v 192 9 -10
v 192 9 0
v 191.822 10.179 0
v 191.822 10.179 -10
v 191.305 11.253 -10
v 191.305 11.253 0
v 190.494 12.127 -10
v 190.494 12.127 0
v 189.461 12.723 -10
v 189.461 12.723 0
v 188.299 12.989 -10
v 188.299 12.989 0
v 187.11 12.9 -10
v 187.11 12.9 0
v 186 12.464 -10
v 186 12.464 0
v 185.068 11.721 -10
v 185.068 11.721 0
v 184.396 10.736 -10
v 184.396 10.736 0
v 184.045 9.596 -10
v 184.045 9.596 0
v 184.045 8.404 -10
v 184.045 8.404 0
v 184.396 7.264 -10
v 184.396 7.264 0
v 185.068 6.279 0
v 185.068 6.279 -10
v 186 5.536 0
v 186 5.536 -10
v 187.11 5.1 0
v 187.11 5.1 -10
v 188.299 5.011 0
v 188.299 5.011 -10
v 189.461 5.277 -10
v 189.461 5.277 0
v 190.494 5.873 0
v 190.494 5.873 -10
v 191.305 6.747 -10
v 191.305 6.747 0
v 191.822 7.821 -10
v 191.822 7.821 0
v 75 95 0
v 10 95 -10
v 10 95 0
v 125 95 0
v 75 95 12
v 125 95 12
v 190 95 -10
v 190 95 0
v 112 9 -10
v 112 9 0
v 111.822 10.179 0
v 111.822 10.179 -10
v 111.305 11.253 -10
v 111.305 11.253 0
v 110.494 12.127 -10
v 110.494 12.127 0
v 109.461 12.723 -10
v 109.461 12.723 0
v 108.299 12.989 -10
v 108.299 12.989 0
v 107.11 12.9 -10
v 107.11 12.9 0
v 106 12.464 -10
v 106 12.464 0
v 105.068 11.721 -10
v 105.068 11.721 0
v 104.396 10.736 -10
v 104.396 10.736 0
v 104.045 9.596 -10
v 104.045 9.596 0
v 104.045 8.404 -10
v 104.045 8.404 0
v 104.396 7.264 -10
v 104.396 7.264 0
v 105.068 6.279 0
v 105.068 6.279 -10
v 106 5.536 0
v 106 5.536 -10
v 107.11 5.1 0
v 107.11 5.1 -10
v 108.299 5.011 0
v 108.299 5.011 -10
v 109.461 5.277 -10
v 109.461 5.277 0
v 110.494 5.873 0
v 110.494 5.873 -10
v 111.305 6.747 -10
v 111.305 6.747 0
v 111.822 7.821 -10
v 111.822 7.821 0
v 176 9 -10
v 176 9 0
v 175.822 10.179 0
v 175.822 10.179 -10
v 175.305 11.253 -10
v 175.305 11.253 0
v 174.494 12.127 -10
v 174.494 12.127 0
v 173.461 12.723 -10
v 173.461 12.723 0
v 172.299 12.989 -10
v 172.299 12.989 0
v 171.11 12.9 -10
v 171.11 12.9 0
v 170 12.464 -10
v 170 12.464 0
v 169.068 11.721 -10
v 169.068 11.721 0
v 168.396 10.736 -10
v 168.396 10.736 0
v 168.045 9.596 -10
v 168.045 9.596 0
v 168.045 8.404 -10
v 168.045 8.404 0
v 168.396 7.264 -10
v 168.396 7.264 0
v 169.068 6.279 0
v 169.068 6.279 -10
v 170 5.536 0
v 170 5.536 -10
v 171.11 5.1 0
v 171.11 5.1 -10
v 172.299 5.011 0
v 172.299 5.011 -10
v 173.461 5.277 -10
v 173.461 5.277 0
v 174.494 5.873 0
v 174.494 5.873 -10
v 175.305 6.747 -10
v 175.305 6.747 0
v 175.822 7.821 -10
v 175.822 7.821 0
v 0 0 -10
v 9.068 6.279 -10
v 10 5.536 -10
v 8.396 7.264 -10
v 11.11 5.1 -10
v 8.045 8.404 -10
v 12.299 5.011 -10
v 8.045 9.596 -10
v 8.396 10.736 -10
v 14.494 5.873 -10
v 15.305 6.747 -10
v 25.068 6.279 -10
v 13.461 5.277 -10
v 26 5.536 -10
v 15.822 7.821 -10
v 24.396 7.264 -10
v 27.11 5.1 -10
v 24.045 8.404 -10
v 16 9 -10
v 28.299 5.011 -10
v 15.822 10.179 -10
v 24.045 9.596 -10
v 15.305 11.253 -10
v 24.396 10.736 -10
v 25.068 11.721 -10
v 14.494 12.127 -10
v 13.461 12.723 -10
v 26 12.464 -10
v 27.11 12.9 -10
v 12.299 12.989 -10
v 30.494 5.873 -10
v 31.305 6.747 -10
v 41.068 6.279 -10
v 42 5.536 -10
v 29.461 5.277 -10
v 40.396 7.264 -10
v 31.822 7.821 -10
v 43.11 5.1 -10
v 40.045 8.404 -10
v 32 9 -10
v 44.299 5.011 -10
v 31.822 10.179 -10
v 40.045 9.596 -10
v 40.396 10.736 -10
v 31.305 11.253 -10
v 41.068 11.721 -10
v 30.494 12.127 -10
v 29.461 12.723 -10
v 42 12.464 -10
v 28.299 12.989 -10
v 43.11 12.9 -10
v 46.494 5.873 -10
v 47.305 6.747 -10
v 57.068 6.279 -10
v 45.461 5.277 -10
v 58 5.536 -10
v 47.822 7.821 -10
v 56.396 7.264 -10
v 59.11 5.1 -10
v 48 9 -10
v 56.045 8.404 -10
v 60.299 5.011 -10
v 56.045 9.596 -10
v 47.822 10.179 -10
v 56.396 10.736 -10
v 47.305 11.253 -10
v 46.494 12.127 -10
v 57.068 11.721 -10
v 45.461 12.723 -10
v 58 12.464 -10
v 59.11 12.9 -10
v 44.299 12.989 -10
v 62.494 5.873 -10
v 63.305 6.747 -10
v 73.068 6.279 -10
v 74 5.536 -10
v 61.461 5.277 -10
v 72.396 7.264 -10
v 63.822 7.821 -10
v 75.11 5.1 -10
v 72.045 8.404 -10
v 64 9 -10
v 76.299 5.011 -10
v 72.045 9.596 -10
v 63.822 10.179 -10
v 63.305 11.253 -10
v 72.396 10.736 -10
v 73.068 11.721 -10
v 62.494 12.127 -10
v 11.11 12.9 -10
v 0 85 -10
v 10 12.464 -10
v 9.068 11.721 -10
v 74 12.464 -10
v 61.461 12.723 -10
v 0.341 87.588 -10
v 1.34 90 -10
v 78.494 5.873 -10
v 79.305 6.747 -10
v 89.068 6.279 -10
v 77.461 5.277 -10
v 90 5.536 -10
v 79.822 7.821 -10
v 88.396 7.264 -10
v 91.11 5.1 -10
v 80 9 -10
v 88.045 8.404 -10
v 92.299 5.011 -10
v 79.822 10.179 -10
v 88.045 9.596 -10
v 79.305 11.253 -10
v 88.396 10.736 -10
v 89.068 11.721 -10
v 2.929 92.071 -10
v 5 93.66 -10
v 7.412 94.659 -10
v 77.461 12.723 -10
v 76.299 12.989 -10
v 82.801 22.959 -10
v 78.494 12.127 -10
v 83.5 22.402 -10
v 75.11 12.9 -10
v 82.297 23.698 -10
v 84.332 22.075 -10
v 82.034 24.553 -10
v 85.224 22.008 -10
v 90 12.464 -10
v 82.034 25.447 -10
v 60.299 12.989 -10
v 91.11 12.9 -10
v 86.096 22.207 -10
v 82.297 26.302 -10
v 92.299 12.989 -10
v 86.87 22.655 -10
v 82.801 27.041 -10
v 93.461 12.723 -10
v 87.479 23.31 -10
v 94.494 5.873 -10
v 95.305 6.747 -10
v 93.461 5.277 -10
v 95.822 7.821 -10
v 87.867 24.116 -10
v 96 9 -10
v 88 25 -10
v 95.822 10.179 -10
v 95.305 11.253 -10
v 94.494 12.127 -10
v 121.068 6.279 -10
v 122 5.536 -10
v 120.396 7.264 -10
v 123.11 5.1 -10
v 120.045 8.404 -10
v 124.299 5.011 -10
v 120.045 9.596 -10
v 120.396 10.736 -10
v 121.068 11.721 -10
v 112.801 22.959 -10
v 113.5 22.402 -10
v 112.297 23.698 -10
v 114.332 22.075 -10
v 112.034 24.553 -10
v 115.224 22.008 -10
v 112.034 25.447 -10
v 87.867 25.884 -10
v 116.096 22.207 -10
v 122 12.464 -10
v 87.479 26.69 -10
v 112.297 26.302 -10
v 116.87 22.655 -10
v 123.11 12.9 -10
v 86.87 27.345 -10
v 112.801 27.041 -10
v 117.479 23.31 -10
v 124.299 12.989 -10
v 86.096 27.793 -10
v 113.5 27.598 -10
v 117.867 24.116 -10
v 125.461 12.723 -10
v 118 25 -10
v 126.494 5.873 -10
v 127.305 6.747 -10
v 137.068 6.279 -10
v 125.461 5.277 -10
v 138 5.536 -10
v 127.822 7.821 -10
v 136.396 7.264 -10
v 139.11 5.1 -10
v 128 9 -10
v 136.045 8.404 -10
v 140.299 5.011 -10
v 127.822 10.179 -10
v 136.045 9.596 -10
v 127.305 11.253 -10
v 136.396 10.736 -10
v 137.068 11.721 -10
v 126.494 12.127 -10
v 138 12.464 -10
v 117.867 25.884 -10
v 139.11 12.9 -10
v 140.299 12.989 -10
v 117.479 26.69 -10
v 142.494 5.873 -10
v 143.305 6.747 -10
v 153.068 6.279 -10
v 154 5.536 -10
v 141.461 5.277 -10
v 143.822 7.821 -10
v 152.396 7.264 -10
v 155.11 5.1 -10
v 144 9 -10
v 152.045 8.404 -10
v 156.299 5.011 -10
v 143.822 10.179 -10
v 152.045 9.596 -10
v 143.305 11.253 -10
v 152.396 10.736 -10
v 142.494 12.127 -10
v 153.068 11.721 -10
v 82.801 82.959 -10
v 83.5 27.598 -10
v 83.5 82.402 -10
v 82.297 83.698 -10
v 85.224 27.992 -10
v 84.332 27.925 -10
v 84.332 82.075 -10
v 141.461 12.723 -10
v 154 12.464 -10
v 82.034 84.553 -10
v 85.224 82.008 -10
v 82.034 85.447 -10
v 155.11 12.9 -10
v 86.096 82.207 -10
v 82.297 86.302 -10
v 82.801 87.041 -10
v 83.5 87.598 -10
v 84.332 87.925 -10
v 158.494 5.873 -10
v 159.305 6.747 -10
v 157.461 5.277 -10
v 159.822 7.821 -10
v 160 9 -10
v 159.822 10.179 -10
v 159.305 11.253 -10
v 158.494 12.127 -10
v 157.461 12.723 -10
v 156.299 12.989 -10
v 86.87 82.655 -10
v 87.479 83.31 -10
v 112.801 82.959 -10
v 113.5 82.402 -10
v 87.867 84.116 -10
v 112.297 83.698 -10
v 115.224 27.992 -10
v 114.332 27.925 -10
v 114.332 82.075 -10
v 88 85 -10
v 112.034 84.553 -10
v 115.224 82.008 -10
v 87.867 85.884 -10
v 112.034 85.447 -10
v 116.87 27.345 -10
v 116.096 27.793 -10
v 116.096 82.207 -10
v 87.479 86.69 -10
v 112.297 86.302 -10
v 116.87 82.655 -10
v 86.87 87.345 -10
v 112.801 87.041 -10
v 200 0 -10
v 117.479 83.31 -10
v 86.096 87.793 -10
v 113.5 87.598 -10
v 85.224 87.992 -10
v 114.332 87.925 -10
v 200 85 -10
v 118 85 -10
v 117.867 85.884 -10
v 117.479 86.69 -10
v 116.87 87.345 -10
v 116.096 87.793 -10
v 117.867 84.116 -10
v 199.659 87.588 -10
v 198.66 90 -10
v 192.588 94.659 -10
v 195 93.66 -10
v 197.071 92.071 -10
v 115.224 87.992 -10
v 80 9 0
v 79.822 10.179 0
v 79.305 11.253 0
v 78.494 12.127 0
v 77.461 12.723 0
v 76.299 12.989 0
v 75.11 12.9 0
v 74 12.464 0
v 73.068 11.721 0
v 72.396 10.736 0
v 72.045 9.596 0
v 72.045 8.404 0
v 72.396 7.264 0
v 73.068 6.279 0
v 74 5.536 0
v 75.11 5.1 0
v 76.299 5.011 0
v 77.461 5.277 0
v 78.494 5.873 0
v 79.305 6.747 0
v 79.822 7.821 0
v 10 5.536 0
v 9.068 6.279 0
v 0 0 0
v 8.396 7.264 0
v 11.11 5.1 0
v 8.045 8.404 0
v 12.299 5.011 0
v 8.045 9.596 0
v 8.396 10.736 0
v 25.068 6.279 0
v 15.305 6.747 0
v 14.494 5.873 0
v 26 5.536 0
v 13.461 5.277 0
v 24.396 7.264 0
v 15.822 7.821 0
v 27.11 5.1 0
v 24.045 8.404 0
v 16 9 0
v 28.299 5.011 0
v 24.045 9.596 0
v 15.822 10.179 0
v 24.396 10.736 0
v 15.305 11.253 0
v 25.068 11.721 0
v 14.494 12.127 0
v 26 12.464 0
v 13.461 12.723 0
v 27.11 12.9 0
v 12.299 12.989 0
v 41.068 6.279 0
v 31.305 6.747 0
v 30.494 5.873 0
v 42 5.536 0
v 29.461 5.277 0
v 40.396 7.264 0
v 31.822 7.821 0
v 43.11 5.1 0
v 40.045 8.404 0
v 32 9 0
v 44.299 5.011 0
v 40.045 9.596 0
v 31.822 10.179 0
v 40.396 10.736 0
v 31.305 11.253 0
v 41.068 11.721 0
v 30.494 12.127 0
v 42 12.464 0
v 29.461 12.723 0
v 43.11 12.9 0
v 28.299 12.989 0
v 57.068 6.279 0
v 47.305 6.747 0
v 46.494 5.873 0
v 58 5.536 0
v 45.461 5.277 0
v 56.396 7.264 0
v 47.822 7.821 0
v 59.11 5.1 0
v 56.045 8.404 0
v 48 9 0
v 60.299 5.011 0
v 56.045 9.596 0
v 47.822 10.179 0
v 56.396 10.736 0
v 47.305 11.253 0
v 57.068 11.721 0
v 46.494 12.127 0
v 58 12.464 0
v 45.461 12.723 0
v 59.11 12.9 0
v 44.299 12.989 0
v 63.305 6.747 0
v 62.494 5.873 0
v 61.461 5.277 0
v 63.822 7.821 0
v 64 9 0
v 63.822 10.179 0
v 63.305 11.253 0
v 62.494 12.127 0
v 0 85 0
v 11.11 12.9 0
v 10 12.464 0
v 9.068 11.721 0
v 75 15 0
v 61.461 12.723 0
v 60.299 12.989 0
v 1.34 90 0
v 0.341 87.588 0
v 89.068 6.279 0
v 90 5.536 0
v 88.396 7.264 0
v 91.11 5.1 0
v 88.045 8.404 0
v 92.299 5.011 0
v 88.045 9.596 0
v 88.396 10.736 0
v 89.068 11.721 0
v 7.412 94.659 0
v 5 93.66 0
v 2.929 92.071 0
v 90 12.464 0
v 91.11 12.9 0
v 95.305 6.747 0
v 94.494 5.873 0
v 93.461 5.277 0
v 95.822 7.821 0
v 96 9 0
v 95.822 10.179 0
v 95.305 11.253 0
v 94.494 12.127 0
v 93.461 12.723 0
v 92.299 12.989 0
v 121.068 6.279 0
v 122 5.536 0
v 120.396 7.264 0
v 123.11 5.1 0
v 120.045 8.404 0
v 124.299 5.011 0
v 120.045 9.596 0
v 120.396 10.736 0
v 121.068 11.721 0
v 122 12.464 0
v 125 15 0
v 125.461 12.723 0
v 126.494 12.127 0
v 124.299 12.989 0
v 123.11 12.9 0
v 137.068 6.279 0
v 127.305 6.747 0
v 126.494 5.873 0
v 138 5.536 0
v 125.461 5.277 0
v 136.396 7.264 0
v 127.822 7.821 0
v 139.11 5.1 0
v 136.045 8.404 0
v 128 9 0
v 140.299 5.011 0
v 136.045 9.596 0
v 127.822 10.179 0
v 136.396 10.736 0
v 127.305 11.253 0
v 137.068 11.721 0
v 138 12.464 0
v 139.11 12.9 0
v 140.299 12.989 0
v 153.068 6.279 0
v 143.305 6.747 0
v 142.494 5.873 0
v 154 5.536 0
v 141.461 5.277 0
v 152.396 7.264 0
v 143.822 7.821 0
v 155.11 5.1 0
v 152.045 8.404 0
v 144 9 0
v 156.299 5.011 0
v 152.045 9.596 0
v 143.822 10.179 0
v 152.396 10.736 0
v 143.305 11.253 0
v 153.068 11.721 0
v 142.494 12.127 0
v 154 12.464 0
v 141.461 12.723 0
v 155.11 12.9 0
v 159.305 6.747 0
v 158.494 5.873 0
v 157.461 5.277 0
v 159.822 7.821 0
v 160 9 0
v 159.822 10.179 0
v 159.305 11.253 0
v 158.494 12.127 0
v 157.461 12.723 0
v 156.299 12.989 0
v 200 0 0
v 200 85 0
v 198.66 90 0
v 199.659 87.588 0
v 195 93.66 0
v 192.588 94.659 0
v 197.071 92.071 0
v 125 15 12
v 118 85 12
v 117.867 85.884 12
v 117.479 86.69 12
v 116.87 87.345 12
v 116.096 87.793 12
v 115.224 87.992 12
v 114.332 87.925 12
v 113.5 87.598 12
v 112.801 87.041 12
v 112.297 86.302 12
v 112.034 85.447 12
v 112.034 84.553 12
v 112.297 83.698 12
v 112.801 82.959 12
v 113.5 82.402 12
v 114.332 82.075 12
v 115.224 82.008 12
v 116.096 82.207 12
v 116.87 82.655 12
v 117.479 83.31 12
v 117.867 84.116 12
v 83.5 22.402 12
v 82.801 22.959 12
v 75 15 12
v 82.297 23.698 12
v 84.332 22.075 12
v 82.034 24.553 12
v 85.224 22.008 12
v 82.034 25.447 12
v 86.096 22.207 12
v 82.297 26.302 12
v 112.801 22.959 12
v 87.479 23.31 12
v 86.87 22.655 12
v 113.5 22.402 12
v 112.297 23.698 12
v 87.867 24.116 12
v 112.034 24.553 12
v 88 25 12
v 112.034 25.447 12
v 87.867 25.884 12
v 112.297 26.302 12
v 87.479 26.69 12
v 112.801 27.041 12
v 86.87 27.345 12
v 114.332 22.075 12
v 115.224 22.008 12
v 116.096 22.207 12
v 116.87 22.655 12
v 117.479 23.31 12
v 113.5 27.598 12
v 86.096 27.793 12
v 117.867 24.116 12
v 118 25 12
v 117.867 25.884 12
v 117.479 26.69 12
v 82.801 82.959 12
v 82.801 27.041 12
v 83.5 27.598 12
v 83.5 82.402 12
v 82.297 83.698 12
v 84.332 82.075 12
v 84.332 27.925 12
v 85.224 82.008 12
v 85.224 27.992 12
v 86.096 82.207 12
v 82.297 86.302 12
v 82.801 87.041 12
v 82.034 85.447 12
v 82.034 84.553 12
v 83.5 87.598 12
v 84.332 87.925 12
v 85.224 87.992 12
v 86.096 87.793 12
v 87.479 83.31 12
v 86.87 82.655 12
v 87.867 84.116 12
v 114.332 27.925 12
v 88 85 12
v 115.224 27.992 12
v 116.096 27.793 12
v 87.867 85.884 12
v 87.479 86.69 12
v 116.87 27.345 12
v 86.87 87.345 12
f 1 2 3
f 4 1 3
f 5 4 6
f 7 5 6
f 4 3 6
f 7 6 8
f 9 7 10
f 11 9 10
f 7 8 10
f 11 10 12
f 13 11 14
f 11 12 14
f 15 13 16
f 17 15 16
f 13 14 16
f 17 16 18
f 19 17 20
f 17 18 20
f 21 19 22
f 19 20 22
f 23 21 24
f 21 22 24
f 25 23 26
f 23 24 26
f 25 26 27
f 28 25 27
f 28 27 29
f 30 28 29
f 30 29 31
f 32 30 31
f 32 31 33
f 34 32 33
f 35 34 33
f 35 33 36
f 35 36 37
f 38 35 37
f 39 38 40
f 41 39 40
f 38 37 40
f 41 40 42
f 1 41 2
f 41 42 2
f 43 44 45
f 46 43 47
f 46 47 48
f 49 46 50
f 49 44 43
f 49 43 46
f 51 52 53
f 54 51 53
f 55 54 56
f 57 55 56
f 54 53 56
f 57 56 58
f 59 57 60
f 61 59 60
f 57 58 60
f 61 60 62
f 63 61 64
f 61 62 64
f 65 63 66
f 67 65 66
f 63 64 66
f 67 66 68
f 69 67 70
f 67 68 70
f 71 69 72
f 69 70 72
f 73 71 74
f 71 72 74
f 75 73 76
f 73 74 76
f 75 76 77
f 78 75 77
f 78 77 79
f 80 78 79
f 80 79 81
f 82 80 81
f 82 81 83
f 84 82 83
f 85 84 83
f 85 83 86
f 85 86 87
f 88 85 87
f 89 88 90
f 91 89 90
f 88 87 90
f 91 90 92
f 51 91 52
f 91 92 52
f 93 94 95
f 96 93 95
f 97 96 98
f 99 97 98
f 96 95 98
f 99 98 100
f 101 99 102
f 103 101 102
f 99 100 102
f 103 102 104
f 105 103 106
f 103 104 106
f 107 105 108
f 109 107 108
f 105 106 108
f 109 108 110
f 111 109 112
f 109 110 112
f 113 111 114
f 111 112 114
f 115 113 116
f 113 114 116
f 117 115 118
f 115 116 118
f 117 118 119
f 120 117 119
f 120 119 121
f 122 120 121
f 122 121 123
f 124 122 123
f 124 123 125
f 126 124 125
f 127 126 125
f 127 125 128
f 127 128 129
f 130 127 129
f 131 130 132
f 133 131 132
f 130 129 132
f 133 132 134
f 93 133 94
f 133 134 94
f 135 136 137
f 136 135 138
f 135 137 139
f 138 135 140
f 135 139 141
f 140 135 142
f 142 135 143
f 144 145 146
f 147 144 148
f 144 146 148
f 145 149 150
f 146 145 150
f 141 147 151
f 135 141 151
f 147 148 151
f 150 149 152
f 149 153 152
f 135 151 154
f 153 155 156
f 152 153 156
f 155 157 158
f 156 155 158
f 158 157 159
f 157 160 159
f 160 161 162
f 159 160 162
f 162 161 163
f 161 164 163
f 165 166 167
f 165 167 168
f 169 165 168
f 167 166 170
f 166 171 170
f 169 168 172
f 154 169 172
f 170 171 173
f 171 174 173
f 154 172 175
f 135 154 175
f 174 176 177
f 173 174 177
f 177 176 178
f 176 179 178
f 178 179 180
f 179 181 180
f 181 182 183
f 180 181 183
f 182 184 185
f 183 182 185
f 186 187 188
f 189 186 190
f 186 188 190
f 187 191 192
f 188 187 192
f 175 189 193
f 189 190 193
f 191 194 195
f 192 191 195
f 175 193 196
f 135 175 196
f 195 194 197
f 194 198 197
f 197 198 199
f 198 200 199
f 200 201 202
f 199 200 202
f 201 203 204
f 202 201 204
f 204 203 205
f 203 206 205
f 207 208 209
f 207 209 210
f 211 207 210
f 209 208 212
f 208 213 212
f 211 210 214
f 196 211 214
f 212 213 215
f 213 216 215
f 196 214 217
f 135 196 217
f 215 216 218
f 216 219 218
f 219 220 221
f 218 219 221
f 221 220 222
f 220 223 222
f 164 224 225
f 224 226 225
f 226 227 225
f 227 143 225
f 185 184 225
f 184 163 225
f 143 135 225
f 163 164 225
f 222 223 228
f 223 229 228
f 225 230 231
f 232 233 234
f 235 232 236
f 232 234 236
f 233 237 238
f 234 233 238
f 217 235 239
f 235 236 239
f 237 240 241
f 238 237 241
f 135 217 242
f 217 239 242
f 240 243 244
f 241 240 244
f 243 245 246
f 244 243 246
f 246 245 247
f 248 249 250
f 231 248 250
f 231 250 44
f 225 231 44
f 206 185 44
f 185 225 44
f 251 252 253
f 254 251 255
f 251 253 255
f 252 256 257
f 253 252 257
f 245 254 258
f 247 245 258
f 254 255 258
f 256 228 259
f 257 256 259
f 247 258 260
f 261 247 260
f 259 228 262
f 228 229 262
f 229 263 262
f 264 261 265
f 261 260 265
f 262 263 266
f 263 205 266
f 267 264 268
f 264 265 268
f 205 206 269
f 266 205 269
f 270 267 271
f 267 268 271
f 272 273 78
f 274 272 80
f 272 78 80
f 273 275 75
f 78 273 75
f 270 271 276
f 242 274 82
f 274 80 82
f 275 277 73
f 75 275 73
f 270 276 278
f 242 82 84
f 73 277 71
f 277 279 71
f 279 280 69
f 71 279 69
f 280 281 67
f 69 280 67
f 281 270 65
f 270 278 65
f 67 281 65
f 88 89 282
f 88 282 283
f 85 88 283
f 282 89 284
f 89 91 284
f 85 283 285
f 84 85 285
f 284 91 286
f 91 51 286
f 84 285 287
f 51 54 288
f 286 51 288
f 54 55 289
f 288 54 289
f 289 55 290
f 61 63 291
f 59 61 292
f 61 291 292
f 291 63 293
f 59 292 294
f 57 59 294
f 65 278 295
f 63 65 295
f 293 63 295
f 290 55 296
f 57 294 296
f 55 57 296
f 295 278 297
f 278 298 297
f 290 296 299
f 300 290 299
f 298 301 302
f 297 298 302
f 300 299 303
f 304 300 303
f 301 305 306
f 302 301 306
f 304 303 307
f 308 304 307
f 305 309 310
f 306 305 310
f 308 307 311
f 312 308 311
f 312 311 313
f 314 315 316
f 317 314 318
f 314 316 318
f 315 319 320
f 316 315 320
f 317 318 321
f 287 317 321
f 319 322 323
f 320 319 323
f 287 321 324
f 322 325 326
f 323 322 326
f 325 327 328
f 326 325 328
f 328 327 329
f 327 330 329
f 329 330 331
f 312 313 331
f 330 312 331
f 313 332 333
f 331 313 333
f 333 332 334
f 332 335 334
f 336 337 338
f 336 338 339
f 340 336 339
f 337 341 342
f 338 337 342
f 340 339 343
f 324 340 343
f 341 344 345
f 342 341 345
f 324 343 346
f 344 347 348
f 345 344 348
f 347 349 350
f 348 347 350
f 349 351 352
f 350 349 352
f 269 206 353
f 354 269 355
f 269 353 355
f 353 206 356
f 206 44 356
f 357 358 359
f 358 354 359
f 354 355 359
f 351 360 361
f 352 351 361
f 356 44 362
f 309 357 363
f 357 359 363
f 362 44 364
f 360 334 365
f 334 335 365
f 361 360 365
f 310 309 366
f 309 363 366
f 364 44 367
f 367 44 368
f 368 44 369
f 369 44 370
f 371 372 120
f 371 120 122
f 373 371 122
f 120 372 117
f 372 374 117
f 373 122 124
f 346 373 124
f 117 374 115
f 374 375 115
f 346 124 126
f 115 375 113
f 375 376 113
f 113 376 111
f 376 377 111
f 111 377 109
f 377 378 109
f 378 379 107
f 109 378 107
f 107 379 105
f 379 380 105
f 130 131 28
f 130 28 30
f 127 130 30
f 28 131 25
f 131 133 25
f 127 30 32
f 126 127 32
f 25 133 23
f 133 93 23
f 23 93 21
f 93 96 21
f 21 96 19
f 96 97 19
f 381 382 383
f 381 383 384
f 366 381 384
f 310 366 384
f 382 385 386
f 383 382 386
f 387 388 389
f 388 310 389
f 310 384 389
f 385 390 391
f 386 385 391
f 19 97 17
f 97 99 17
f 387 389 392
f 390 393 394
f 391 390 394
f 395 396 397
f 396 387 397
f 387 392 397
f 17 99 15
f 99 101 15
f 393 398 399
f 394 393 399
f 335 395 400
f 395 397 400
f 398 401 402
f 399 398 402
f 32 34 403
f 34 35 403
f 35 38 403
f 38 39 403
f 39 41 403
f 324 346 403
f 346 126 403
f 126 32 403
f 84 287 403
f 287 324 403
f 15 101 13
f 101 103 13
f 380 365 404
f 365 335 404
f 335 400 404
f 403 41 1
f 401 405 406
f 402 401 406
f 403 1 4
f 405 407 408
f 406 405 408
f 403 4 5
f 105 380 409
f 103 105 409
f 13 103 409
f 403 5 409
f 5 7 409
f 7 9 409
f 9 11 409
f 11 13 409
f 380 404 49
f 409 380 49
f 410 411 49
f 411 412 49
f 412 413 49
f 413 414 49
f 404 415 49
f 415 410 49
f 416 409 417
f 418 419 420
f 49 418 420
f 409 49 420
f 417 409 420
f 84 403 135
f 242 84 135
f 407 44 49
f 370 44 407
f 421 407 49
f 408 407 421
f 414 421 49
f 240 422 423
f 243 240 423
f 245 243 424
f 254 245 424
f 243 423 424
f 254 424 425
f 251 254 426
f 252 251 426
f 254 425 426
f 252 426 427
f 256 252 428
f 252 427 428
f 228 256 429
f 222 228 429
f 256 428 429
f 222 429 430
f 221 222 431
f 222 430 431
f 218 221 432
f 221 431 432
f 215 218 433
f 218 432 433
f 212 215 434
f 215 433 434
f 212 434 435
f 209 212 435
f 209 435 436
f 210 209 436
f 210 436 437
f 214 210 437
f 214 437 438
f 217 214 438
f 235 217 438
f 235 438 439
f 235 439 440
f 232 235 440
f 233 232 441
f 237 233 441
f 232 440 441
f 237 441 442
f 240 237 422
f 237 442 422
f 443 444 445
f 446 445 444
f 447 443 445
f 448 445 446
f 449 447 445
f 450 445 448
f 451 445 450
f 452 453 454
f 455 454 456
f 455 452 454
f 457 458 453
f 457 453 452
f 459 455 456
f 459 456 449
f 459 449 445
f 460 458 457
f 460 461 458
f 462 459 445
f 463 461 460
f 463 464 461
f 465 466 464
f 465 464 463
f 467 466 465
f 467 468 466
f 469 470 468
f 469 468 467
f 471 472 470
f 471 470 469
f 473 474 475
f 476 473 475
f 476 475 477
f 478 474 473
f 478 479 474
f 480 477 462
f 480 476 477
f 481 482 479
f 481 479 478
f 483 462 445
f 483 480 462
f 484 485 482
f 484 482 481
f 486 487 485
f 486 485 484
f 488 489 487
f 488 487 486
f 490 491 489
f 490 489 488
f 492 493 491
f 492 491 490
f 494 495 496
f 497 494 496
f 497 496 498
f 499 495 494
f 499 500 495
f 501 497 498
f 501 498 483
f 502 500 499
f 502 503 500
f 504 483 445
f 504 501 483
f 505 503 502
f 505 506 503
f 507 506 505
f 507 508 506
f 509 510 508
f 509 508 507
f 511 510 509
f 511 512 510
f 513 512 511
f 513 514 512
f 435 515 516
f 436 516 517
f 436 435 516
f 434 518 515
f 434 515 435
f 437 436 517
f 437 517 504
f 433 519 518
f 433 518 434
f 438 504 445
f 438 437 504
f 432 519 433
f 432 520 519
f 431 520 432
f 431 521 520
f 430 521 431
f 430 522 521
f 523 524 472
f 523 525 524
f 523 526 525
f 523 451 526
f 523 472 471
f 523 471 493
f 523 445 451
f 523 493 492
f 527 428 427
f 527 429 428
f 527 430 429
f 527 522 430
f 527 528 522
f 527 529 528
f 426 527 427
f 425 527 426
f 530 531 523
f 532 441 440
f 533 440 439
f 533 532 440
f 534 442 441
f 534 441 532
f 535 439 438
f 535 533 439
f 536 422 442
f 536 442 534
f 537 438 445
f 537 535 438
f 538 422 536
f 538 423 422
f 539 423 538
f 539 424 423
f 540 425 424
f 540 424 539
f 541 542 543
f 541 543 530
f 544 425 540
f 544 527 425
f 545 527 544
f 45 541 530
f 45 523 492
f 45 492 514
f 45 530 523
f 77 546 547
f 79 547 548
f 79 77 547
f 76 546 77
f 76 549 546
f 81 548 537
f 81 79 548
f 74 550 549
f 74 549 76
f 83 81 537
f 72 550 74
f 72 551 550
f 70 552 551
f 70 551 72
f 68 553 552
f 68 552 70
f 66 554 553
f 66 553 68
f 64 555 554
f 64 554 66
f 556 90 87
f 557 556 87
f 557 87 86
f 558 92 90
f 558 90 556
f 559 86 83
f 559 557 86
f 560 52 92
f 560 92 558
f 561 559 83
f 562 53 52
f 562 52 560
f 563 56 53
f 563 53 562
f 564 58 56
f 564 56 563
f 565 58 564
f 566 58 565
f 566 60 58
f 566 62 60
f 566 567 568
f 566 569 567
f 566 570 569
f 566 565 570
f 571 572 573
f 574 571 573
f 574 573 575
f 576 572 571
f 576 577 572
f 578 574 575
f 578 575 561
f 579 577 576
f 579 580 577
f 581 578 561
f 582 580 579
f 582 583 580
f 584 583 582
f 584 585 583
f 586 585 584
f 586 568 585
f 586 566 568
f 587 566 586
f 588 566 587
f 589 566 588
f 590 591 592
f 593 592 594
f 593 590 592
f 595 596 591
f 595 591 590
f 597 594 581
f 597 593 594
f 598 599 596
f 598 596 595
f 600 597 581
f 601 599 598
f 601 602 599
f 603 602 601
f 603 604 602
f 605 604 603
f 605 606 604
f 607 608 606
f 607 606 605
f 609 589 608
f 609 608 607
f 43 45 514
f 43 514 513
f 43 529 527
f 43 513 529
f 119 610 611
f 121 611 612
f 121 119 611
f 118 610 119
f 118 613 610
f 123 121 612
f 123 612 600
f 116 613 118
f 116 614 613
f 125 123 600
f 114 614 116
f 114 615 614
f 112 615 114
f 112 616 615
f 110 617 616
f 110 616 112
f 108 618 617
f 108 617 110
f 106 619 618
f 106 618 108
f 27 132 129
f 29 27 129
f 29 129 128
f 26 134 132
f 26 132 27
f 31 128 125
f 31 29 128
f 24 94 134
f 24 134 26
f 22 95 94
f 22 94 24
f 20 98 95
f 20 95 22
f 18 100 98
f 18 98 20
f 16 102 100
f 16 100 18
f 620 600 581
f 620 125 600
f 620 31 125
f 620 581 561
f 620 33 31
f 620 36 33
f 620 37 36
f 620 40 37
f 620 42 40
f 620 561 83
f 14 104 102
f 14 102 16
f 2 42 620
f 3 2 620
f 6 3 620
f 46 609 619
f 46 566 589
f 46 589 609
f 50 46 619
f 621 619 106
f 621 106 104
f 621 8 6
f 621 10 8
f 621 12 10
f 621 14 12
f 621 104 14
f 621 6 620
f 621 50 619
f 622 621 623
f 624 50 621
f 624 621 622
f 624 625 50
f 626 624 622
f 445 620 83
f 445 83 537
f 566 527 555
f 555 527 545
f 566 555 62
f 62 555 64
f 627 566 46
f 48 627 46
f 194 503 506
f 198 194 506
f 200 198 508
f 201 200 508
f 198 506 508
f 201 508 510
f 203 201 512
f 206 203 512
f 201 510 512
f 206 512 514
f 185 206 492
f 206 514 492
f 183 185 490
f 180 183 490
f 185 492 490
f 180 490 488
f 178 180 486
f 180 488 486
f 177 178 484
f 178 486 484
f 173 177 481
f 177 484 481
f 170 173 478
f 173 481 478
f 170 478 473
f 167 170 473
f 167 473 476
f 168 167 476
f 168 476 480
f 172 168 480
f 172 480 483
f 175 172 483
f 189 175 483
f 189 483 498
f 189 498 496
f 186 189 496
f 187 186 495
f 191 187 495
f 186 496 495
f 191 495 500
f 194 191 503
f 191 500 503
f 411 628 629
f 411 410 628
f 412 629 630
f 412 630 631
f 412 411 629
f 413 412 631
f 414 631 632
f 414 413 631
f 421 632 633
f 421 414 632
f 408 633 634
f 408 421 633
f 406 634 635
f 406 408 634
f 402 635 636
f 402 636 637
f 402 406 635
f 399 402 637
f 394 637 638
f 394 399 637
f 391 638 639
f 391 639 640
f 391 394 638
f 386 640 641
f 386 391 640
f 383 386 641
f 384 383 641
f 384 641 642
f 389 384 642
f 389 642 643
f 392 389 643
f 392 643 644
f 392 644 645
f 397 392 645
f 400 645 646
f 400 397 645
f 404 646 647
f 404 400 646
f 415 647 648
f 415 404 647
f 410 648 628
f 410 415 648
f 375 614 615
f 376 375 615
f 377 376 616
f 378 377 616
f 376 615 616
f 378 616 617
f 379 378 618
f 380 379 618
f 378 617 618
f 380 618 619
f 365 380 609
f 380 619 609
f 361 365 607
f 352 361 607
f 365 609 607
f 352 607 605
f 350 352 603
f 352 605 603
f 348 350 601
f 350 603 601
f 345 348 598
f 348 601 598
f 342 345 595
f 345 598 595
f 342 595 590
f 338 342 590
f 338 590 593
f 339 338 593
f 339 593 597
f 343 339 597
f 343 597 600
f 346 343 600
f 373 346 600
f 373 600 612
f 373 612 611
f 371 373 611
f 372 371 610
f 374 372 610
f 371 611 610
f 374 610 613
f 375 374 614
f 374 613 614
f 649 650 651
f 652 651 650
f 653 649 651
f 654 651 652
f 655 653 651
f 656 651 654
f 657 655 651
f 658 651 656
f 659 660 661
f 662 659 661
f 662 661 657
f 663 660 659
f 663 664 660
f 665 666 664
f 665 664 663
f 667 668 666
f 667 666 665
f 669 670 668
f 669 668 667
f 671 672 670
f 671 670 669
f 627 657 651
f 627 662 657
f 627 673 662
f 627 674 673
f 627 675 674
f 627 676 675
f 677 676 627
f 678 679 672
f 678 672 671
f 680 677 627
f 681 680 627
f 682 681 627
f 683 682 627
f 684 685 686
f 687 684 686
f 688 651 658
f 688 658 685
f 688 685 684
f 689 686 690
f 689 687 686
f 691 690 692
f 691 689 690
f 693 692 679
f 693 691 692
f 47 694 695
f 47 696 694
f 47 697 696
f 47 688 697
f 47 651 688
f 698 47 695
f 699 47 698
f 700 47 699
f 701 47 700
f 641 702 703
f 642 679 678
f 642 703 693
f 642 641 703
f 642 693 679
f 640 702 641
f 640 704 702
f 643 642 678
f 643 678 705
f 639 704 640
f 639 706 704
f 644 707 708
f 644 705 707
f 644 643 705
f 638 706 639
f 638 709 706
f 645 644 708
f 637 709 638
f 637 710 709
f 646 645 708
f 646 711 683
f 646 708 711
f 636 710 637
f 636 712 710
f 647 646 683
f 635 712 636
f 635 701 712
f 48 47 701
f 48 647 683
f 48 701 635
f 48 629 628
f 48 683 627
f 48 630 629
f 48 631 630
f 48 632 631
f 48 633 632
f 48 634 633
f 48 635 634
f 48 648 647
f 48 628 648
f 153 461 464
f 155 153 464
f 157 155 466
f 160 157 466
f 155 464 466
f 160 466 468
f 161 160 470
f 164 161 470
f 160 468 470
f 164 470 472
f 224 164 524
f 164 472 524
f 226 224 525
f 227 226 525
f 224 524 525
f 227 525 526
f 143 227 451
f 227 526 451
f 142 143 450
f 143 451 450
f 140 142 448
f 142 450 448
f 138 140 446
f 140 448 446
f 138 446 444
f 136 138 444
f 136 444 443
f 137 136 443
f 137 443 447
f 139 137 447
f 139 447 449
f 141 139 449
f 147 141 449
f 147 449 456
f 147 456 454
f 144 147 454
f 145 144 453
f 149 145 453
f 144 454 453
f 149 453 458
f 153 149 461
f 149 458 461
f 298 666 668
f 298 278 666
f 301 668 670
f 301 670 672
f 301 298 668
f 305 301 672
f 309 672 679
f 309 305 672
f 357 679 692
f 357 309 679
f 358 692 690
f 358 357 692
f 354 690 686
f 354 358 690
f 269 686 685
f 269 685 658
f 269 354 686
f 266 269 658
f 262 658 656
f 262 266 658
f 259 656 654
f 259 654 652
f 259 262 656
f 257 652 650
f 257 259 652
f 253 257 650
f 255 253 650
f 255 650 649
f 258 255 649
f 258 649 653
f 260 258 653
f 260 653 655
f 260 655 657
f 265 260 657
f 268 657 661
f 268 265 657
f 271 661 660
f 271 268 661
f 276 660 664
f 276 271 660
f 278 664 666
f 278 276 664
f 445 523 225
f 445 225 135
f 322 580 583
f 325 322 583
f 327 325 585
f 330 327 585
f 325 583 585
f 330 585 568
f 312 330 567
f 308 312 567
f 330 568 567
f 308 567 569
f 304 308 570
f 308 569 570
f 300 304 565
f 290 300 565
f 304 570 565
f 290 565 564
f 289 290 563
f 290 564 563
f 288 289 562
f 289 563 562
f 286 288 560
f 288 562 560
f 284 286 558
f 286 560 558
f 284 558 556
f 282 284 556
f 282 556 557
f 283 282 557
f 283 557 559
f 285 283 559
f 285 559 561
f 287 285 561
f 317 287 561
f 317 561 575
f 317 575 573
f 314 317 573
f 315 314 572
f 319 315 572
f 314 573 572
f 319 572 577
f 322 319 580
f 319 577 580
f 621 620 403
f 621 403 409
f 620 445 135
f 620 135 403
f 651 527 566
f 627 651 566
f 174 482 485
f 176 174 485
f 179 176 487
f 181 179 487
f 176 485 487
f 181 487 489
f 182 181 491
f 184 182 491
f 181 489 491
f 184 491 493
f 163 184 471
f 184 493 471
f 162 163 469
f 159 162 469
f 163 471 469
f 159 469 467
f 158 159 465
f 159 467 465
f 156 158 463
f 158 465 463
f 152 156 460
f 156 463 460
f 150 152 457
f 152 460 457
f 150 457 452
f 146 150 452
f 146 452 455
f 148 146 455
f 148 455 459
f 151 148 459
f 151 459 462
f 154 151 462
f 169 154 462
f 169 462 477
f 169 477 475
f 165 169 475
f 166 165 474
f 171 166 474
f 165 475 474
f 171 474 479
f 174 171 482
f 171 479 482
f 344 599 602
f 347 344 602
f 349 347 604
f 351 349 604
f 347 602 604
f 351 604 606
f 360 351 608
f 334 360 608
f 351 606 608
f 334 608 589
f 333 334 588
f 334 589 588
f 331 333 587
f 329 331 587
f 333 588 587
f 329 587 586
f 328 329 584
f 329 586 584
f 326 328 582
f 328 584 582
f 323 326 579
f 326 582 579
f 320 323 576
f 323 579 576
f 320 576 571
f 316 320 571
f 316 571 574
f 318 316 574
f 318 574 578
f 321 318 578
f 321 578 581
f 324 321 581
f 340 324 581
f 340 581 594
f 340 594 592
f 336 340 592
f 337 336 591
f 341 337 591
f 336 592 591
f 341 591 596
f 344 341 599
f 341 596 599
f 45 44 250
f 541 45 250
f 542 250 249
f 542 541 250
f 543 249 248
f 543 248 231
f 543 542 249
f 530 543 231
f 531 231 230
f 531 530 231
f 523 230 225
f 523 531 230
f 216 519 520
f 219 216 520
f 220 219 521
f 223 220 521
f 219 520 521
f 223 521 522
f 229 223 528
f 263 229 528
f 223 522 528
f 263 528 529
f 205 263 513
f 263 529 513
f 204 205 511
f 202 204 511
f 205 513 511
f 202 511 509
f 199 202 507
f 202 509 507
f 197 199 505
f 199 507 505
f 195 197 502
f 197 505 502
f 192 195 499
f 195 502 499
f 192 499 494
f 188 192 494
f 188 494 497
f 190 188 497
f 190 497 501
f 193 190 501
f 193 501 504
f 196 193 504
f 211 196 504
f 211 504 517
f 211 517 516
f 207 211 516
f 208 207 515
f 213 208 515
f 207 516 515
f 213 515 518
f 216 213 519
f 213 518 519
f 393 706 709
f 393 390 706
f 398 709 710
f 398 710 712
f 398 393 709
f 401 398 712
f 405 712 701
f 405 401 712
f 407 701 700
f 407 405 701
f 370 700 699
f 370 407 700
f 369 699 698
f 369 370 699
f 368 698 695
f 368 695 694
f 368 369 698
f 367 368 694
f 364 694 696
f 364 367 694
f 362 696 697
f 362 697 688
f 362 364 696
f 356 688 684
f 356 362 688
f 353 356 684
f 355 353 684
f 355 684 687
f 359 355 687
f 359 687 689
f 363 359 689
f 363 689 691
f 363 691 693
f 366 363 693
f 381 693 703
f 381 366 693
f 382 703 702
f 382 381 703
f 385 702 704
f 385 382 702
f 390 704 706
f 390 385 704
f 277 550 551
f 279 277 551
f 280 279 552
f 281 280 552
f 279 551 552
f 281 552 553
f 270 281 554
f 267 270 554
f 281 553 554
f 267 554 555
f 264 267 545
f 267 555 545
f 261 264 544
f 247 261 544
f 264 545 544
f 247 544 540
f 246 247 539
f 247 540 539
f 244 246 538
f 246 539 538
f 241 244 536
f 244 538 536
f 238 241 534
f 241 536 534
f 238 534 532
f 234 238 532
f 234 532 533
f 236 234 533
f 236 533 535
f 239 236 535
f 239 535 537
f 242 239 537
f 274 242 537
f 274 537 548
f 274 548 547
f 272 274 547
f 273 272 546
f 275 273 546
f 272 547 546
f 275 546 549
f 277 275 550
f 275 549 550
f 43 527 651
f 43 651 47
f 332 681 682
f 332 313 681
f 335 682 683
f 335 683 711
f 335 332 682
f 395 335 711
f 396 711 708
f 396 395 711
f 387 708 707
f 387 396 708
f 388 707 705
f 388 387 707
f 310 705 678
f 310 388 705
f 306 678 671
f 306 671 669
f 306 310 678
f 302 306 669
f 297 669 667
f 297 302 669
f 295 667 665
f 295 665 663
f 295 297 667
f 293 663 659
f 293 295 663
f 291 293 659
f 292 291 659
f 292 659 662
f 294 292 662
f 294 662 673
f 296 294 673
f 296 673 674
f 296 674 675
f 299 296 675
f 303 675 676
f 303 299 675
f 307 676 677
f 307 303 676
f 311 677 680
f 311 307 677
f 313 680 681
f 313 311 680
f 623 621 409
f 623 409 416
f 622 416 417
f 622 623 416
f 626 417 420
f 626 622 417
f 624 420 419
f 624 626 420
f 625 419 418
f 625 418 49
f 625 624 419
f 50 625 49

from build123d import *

# Parameters (mm, degrees)
F0_R     = 4
F0_W     = 50
F0_H     = 80
F0_R_2   = 3
F1_DEPTH = 10
F2_DEPTH = 12


with BuildPart() as f1:
    # F0 (on Top) → F1 (new body)
    with BuildSketch(Plane.XY):
        with BuildLine():
            Line((0, 85), (0, 0))
            Line((0, 0), (200, 0))
            Line((200, 0), (200, 85))
            ThreePointArc((200, 85), (197.071068, 92.071068), (190, 95))
            Line((190, 95), (125, 95))
            Line((125, 95), (125, 15))
            Line((125, 15), (75, 15))
            Line((75, 15), (75, 95))
            Line((75, 95), (10, 95))
            ThreePointArc((10, 95), (2.928932, 92.071068), (0, 85))
        make_face()
        with Locations((12, 9)):
            Circle(F0_R, mode=Mode.SUBTRACT)
        with Locations((28, 9)):
            Circle(F0_R, mode=Mode.SUBTRACT)
        with Locations((44, 9)):
            Circle(F0_R, mode=Mode.SUBTRACT)
        with Locations((60, 9)):
            Circle(F0_R, mode=Mode.SUBTRACT)
        with Locations((76, 9)):
            Circle(F0_R, mode=Mode.SUBTRACT)
        with Locations((92, 9)):
            Circle(F0_R, mode=Mode.SUBTRACT)
        with Locations((108, 9)):
            Circle(F0_R, mode=Mode.SUBTRACT)
        with Locations((124, 9)):
            Circle(F0_R, mode=Mode.SUBTRACT)
        with Locations((140, 9)):
            Circle(F0_R, mode=Mode.SUBTRACT)
        with Locations((156, 9)):
            Circle(F0_R, mode=Mode.SUBTRACT)
        with Locations((172, 9)):
            Circle(F0_R, mode=Mode.SUBTRACT)
        with Locations((188, 9)):
            Circle(F0_R, mode=Mode.SUBTRACT)
        with Locations((100, 55)):
            Rectangle(F0_W, F0_H)
        with Locations((85, 25)):
            Circle(F0_R_2, mode=Mode.SUBTRACT)
        with Locations((115, 25)):
            Circle(F0_R_2, mode=Mode.SUBTRACT)
        with Locations((85, 85)):
            Circle(F0_R_2, mode=Mode.SUBTRACT)
        with Locations((115, 85)):
            Circle(F0_R_2, mode=Mode.SUBTRACT)
    extrude(amount=-F1_DEPTH)

    # F0 (on Top) → F2 (join)
    with BuildSketch(Plane.XY):
        with Locations((100, 55)):
            Rectangle(F0_W, F0_H)
        with Locations((85, 25)):
            Circle(F0_R_2, mode=Mode.SUBTRACT)
        with Locations((115, 25)):
            Circle(F0_R_2, mode=Mode.SUBTRACT)
        with Locations((85, 85)):
            Circle(F0_R_2, mode=Mode.SUBTRACT)
        with Locations((115, 85)):
            Circle(F0_R_2, mode=Mode.SUBTRACT)
    extrude(amount=F2_DEPTH)


solid = f1.part
